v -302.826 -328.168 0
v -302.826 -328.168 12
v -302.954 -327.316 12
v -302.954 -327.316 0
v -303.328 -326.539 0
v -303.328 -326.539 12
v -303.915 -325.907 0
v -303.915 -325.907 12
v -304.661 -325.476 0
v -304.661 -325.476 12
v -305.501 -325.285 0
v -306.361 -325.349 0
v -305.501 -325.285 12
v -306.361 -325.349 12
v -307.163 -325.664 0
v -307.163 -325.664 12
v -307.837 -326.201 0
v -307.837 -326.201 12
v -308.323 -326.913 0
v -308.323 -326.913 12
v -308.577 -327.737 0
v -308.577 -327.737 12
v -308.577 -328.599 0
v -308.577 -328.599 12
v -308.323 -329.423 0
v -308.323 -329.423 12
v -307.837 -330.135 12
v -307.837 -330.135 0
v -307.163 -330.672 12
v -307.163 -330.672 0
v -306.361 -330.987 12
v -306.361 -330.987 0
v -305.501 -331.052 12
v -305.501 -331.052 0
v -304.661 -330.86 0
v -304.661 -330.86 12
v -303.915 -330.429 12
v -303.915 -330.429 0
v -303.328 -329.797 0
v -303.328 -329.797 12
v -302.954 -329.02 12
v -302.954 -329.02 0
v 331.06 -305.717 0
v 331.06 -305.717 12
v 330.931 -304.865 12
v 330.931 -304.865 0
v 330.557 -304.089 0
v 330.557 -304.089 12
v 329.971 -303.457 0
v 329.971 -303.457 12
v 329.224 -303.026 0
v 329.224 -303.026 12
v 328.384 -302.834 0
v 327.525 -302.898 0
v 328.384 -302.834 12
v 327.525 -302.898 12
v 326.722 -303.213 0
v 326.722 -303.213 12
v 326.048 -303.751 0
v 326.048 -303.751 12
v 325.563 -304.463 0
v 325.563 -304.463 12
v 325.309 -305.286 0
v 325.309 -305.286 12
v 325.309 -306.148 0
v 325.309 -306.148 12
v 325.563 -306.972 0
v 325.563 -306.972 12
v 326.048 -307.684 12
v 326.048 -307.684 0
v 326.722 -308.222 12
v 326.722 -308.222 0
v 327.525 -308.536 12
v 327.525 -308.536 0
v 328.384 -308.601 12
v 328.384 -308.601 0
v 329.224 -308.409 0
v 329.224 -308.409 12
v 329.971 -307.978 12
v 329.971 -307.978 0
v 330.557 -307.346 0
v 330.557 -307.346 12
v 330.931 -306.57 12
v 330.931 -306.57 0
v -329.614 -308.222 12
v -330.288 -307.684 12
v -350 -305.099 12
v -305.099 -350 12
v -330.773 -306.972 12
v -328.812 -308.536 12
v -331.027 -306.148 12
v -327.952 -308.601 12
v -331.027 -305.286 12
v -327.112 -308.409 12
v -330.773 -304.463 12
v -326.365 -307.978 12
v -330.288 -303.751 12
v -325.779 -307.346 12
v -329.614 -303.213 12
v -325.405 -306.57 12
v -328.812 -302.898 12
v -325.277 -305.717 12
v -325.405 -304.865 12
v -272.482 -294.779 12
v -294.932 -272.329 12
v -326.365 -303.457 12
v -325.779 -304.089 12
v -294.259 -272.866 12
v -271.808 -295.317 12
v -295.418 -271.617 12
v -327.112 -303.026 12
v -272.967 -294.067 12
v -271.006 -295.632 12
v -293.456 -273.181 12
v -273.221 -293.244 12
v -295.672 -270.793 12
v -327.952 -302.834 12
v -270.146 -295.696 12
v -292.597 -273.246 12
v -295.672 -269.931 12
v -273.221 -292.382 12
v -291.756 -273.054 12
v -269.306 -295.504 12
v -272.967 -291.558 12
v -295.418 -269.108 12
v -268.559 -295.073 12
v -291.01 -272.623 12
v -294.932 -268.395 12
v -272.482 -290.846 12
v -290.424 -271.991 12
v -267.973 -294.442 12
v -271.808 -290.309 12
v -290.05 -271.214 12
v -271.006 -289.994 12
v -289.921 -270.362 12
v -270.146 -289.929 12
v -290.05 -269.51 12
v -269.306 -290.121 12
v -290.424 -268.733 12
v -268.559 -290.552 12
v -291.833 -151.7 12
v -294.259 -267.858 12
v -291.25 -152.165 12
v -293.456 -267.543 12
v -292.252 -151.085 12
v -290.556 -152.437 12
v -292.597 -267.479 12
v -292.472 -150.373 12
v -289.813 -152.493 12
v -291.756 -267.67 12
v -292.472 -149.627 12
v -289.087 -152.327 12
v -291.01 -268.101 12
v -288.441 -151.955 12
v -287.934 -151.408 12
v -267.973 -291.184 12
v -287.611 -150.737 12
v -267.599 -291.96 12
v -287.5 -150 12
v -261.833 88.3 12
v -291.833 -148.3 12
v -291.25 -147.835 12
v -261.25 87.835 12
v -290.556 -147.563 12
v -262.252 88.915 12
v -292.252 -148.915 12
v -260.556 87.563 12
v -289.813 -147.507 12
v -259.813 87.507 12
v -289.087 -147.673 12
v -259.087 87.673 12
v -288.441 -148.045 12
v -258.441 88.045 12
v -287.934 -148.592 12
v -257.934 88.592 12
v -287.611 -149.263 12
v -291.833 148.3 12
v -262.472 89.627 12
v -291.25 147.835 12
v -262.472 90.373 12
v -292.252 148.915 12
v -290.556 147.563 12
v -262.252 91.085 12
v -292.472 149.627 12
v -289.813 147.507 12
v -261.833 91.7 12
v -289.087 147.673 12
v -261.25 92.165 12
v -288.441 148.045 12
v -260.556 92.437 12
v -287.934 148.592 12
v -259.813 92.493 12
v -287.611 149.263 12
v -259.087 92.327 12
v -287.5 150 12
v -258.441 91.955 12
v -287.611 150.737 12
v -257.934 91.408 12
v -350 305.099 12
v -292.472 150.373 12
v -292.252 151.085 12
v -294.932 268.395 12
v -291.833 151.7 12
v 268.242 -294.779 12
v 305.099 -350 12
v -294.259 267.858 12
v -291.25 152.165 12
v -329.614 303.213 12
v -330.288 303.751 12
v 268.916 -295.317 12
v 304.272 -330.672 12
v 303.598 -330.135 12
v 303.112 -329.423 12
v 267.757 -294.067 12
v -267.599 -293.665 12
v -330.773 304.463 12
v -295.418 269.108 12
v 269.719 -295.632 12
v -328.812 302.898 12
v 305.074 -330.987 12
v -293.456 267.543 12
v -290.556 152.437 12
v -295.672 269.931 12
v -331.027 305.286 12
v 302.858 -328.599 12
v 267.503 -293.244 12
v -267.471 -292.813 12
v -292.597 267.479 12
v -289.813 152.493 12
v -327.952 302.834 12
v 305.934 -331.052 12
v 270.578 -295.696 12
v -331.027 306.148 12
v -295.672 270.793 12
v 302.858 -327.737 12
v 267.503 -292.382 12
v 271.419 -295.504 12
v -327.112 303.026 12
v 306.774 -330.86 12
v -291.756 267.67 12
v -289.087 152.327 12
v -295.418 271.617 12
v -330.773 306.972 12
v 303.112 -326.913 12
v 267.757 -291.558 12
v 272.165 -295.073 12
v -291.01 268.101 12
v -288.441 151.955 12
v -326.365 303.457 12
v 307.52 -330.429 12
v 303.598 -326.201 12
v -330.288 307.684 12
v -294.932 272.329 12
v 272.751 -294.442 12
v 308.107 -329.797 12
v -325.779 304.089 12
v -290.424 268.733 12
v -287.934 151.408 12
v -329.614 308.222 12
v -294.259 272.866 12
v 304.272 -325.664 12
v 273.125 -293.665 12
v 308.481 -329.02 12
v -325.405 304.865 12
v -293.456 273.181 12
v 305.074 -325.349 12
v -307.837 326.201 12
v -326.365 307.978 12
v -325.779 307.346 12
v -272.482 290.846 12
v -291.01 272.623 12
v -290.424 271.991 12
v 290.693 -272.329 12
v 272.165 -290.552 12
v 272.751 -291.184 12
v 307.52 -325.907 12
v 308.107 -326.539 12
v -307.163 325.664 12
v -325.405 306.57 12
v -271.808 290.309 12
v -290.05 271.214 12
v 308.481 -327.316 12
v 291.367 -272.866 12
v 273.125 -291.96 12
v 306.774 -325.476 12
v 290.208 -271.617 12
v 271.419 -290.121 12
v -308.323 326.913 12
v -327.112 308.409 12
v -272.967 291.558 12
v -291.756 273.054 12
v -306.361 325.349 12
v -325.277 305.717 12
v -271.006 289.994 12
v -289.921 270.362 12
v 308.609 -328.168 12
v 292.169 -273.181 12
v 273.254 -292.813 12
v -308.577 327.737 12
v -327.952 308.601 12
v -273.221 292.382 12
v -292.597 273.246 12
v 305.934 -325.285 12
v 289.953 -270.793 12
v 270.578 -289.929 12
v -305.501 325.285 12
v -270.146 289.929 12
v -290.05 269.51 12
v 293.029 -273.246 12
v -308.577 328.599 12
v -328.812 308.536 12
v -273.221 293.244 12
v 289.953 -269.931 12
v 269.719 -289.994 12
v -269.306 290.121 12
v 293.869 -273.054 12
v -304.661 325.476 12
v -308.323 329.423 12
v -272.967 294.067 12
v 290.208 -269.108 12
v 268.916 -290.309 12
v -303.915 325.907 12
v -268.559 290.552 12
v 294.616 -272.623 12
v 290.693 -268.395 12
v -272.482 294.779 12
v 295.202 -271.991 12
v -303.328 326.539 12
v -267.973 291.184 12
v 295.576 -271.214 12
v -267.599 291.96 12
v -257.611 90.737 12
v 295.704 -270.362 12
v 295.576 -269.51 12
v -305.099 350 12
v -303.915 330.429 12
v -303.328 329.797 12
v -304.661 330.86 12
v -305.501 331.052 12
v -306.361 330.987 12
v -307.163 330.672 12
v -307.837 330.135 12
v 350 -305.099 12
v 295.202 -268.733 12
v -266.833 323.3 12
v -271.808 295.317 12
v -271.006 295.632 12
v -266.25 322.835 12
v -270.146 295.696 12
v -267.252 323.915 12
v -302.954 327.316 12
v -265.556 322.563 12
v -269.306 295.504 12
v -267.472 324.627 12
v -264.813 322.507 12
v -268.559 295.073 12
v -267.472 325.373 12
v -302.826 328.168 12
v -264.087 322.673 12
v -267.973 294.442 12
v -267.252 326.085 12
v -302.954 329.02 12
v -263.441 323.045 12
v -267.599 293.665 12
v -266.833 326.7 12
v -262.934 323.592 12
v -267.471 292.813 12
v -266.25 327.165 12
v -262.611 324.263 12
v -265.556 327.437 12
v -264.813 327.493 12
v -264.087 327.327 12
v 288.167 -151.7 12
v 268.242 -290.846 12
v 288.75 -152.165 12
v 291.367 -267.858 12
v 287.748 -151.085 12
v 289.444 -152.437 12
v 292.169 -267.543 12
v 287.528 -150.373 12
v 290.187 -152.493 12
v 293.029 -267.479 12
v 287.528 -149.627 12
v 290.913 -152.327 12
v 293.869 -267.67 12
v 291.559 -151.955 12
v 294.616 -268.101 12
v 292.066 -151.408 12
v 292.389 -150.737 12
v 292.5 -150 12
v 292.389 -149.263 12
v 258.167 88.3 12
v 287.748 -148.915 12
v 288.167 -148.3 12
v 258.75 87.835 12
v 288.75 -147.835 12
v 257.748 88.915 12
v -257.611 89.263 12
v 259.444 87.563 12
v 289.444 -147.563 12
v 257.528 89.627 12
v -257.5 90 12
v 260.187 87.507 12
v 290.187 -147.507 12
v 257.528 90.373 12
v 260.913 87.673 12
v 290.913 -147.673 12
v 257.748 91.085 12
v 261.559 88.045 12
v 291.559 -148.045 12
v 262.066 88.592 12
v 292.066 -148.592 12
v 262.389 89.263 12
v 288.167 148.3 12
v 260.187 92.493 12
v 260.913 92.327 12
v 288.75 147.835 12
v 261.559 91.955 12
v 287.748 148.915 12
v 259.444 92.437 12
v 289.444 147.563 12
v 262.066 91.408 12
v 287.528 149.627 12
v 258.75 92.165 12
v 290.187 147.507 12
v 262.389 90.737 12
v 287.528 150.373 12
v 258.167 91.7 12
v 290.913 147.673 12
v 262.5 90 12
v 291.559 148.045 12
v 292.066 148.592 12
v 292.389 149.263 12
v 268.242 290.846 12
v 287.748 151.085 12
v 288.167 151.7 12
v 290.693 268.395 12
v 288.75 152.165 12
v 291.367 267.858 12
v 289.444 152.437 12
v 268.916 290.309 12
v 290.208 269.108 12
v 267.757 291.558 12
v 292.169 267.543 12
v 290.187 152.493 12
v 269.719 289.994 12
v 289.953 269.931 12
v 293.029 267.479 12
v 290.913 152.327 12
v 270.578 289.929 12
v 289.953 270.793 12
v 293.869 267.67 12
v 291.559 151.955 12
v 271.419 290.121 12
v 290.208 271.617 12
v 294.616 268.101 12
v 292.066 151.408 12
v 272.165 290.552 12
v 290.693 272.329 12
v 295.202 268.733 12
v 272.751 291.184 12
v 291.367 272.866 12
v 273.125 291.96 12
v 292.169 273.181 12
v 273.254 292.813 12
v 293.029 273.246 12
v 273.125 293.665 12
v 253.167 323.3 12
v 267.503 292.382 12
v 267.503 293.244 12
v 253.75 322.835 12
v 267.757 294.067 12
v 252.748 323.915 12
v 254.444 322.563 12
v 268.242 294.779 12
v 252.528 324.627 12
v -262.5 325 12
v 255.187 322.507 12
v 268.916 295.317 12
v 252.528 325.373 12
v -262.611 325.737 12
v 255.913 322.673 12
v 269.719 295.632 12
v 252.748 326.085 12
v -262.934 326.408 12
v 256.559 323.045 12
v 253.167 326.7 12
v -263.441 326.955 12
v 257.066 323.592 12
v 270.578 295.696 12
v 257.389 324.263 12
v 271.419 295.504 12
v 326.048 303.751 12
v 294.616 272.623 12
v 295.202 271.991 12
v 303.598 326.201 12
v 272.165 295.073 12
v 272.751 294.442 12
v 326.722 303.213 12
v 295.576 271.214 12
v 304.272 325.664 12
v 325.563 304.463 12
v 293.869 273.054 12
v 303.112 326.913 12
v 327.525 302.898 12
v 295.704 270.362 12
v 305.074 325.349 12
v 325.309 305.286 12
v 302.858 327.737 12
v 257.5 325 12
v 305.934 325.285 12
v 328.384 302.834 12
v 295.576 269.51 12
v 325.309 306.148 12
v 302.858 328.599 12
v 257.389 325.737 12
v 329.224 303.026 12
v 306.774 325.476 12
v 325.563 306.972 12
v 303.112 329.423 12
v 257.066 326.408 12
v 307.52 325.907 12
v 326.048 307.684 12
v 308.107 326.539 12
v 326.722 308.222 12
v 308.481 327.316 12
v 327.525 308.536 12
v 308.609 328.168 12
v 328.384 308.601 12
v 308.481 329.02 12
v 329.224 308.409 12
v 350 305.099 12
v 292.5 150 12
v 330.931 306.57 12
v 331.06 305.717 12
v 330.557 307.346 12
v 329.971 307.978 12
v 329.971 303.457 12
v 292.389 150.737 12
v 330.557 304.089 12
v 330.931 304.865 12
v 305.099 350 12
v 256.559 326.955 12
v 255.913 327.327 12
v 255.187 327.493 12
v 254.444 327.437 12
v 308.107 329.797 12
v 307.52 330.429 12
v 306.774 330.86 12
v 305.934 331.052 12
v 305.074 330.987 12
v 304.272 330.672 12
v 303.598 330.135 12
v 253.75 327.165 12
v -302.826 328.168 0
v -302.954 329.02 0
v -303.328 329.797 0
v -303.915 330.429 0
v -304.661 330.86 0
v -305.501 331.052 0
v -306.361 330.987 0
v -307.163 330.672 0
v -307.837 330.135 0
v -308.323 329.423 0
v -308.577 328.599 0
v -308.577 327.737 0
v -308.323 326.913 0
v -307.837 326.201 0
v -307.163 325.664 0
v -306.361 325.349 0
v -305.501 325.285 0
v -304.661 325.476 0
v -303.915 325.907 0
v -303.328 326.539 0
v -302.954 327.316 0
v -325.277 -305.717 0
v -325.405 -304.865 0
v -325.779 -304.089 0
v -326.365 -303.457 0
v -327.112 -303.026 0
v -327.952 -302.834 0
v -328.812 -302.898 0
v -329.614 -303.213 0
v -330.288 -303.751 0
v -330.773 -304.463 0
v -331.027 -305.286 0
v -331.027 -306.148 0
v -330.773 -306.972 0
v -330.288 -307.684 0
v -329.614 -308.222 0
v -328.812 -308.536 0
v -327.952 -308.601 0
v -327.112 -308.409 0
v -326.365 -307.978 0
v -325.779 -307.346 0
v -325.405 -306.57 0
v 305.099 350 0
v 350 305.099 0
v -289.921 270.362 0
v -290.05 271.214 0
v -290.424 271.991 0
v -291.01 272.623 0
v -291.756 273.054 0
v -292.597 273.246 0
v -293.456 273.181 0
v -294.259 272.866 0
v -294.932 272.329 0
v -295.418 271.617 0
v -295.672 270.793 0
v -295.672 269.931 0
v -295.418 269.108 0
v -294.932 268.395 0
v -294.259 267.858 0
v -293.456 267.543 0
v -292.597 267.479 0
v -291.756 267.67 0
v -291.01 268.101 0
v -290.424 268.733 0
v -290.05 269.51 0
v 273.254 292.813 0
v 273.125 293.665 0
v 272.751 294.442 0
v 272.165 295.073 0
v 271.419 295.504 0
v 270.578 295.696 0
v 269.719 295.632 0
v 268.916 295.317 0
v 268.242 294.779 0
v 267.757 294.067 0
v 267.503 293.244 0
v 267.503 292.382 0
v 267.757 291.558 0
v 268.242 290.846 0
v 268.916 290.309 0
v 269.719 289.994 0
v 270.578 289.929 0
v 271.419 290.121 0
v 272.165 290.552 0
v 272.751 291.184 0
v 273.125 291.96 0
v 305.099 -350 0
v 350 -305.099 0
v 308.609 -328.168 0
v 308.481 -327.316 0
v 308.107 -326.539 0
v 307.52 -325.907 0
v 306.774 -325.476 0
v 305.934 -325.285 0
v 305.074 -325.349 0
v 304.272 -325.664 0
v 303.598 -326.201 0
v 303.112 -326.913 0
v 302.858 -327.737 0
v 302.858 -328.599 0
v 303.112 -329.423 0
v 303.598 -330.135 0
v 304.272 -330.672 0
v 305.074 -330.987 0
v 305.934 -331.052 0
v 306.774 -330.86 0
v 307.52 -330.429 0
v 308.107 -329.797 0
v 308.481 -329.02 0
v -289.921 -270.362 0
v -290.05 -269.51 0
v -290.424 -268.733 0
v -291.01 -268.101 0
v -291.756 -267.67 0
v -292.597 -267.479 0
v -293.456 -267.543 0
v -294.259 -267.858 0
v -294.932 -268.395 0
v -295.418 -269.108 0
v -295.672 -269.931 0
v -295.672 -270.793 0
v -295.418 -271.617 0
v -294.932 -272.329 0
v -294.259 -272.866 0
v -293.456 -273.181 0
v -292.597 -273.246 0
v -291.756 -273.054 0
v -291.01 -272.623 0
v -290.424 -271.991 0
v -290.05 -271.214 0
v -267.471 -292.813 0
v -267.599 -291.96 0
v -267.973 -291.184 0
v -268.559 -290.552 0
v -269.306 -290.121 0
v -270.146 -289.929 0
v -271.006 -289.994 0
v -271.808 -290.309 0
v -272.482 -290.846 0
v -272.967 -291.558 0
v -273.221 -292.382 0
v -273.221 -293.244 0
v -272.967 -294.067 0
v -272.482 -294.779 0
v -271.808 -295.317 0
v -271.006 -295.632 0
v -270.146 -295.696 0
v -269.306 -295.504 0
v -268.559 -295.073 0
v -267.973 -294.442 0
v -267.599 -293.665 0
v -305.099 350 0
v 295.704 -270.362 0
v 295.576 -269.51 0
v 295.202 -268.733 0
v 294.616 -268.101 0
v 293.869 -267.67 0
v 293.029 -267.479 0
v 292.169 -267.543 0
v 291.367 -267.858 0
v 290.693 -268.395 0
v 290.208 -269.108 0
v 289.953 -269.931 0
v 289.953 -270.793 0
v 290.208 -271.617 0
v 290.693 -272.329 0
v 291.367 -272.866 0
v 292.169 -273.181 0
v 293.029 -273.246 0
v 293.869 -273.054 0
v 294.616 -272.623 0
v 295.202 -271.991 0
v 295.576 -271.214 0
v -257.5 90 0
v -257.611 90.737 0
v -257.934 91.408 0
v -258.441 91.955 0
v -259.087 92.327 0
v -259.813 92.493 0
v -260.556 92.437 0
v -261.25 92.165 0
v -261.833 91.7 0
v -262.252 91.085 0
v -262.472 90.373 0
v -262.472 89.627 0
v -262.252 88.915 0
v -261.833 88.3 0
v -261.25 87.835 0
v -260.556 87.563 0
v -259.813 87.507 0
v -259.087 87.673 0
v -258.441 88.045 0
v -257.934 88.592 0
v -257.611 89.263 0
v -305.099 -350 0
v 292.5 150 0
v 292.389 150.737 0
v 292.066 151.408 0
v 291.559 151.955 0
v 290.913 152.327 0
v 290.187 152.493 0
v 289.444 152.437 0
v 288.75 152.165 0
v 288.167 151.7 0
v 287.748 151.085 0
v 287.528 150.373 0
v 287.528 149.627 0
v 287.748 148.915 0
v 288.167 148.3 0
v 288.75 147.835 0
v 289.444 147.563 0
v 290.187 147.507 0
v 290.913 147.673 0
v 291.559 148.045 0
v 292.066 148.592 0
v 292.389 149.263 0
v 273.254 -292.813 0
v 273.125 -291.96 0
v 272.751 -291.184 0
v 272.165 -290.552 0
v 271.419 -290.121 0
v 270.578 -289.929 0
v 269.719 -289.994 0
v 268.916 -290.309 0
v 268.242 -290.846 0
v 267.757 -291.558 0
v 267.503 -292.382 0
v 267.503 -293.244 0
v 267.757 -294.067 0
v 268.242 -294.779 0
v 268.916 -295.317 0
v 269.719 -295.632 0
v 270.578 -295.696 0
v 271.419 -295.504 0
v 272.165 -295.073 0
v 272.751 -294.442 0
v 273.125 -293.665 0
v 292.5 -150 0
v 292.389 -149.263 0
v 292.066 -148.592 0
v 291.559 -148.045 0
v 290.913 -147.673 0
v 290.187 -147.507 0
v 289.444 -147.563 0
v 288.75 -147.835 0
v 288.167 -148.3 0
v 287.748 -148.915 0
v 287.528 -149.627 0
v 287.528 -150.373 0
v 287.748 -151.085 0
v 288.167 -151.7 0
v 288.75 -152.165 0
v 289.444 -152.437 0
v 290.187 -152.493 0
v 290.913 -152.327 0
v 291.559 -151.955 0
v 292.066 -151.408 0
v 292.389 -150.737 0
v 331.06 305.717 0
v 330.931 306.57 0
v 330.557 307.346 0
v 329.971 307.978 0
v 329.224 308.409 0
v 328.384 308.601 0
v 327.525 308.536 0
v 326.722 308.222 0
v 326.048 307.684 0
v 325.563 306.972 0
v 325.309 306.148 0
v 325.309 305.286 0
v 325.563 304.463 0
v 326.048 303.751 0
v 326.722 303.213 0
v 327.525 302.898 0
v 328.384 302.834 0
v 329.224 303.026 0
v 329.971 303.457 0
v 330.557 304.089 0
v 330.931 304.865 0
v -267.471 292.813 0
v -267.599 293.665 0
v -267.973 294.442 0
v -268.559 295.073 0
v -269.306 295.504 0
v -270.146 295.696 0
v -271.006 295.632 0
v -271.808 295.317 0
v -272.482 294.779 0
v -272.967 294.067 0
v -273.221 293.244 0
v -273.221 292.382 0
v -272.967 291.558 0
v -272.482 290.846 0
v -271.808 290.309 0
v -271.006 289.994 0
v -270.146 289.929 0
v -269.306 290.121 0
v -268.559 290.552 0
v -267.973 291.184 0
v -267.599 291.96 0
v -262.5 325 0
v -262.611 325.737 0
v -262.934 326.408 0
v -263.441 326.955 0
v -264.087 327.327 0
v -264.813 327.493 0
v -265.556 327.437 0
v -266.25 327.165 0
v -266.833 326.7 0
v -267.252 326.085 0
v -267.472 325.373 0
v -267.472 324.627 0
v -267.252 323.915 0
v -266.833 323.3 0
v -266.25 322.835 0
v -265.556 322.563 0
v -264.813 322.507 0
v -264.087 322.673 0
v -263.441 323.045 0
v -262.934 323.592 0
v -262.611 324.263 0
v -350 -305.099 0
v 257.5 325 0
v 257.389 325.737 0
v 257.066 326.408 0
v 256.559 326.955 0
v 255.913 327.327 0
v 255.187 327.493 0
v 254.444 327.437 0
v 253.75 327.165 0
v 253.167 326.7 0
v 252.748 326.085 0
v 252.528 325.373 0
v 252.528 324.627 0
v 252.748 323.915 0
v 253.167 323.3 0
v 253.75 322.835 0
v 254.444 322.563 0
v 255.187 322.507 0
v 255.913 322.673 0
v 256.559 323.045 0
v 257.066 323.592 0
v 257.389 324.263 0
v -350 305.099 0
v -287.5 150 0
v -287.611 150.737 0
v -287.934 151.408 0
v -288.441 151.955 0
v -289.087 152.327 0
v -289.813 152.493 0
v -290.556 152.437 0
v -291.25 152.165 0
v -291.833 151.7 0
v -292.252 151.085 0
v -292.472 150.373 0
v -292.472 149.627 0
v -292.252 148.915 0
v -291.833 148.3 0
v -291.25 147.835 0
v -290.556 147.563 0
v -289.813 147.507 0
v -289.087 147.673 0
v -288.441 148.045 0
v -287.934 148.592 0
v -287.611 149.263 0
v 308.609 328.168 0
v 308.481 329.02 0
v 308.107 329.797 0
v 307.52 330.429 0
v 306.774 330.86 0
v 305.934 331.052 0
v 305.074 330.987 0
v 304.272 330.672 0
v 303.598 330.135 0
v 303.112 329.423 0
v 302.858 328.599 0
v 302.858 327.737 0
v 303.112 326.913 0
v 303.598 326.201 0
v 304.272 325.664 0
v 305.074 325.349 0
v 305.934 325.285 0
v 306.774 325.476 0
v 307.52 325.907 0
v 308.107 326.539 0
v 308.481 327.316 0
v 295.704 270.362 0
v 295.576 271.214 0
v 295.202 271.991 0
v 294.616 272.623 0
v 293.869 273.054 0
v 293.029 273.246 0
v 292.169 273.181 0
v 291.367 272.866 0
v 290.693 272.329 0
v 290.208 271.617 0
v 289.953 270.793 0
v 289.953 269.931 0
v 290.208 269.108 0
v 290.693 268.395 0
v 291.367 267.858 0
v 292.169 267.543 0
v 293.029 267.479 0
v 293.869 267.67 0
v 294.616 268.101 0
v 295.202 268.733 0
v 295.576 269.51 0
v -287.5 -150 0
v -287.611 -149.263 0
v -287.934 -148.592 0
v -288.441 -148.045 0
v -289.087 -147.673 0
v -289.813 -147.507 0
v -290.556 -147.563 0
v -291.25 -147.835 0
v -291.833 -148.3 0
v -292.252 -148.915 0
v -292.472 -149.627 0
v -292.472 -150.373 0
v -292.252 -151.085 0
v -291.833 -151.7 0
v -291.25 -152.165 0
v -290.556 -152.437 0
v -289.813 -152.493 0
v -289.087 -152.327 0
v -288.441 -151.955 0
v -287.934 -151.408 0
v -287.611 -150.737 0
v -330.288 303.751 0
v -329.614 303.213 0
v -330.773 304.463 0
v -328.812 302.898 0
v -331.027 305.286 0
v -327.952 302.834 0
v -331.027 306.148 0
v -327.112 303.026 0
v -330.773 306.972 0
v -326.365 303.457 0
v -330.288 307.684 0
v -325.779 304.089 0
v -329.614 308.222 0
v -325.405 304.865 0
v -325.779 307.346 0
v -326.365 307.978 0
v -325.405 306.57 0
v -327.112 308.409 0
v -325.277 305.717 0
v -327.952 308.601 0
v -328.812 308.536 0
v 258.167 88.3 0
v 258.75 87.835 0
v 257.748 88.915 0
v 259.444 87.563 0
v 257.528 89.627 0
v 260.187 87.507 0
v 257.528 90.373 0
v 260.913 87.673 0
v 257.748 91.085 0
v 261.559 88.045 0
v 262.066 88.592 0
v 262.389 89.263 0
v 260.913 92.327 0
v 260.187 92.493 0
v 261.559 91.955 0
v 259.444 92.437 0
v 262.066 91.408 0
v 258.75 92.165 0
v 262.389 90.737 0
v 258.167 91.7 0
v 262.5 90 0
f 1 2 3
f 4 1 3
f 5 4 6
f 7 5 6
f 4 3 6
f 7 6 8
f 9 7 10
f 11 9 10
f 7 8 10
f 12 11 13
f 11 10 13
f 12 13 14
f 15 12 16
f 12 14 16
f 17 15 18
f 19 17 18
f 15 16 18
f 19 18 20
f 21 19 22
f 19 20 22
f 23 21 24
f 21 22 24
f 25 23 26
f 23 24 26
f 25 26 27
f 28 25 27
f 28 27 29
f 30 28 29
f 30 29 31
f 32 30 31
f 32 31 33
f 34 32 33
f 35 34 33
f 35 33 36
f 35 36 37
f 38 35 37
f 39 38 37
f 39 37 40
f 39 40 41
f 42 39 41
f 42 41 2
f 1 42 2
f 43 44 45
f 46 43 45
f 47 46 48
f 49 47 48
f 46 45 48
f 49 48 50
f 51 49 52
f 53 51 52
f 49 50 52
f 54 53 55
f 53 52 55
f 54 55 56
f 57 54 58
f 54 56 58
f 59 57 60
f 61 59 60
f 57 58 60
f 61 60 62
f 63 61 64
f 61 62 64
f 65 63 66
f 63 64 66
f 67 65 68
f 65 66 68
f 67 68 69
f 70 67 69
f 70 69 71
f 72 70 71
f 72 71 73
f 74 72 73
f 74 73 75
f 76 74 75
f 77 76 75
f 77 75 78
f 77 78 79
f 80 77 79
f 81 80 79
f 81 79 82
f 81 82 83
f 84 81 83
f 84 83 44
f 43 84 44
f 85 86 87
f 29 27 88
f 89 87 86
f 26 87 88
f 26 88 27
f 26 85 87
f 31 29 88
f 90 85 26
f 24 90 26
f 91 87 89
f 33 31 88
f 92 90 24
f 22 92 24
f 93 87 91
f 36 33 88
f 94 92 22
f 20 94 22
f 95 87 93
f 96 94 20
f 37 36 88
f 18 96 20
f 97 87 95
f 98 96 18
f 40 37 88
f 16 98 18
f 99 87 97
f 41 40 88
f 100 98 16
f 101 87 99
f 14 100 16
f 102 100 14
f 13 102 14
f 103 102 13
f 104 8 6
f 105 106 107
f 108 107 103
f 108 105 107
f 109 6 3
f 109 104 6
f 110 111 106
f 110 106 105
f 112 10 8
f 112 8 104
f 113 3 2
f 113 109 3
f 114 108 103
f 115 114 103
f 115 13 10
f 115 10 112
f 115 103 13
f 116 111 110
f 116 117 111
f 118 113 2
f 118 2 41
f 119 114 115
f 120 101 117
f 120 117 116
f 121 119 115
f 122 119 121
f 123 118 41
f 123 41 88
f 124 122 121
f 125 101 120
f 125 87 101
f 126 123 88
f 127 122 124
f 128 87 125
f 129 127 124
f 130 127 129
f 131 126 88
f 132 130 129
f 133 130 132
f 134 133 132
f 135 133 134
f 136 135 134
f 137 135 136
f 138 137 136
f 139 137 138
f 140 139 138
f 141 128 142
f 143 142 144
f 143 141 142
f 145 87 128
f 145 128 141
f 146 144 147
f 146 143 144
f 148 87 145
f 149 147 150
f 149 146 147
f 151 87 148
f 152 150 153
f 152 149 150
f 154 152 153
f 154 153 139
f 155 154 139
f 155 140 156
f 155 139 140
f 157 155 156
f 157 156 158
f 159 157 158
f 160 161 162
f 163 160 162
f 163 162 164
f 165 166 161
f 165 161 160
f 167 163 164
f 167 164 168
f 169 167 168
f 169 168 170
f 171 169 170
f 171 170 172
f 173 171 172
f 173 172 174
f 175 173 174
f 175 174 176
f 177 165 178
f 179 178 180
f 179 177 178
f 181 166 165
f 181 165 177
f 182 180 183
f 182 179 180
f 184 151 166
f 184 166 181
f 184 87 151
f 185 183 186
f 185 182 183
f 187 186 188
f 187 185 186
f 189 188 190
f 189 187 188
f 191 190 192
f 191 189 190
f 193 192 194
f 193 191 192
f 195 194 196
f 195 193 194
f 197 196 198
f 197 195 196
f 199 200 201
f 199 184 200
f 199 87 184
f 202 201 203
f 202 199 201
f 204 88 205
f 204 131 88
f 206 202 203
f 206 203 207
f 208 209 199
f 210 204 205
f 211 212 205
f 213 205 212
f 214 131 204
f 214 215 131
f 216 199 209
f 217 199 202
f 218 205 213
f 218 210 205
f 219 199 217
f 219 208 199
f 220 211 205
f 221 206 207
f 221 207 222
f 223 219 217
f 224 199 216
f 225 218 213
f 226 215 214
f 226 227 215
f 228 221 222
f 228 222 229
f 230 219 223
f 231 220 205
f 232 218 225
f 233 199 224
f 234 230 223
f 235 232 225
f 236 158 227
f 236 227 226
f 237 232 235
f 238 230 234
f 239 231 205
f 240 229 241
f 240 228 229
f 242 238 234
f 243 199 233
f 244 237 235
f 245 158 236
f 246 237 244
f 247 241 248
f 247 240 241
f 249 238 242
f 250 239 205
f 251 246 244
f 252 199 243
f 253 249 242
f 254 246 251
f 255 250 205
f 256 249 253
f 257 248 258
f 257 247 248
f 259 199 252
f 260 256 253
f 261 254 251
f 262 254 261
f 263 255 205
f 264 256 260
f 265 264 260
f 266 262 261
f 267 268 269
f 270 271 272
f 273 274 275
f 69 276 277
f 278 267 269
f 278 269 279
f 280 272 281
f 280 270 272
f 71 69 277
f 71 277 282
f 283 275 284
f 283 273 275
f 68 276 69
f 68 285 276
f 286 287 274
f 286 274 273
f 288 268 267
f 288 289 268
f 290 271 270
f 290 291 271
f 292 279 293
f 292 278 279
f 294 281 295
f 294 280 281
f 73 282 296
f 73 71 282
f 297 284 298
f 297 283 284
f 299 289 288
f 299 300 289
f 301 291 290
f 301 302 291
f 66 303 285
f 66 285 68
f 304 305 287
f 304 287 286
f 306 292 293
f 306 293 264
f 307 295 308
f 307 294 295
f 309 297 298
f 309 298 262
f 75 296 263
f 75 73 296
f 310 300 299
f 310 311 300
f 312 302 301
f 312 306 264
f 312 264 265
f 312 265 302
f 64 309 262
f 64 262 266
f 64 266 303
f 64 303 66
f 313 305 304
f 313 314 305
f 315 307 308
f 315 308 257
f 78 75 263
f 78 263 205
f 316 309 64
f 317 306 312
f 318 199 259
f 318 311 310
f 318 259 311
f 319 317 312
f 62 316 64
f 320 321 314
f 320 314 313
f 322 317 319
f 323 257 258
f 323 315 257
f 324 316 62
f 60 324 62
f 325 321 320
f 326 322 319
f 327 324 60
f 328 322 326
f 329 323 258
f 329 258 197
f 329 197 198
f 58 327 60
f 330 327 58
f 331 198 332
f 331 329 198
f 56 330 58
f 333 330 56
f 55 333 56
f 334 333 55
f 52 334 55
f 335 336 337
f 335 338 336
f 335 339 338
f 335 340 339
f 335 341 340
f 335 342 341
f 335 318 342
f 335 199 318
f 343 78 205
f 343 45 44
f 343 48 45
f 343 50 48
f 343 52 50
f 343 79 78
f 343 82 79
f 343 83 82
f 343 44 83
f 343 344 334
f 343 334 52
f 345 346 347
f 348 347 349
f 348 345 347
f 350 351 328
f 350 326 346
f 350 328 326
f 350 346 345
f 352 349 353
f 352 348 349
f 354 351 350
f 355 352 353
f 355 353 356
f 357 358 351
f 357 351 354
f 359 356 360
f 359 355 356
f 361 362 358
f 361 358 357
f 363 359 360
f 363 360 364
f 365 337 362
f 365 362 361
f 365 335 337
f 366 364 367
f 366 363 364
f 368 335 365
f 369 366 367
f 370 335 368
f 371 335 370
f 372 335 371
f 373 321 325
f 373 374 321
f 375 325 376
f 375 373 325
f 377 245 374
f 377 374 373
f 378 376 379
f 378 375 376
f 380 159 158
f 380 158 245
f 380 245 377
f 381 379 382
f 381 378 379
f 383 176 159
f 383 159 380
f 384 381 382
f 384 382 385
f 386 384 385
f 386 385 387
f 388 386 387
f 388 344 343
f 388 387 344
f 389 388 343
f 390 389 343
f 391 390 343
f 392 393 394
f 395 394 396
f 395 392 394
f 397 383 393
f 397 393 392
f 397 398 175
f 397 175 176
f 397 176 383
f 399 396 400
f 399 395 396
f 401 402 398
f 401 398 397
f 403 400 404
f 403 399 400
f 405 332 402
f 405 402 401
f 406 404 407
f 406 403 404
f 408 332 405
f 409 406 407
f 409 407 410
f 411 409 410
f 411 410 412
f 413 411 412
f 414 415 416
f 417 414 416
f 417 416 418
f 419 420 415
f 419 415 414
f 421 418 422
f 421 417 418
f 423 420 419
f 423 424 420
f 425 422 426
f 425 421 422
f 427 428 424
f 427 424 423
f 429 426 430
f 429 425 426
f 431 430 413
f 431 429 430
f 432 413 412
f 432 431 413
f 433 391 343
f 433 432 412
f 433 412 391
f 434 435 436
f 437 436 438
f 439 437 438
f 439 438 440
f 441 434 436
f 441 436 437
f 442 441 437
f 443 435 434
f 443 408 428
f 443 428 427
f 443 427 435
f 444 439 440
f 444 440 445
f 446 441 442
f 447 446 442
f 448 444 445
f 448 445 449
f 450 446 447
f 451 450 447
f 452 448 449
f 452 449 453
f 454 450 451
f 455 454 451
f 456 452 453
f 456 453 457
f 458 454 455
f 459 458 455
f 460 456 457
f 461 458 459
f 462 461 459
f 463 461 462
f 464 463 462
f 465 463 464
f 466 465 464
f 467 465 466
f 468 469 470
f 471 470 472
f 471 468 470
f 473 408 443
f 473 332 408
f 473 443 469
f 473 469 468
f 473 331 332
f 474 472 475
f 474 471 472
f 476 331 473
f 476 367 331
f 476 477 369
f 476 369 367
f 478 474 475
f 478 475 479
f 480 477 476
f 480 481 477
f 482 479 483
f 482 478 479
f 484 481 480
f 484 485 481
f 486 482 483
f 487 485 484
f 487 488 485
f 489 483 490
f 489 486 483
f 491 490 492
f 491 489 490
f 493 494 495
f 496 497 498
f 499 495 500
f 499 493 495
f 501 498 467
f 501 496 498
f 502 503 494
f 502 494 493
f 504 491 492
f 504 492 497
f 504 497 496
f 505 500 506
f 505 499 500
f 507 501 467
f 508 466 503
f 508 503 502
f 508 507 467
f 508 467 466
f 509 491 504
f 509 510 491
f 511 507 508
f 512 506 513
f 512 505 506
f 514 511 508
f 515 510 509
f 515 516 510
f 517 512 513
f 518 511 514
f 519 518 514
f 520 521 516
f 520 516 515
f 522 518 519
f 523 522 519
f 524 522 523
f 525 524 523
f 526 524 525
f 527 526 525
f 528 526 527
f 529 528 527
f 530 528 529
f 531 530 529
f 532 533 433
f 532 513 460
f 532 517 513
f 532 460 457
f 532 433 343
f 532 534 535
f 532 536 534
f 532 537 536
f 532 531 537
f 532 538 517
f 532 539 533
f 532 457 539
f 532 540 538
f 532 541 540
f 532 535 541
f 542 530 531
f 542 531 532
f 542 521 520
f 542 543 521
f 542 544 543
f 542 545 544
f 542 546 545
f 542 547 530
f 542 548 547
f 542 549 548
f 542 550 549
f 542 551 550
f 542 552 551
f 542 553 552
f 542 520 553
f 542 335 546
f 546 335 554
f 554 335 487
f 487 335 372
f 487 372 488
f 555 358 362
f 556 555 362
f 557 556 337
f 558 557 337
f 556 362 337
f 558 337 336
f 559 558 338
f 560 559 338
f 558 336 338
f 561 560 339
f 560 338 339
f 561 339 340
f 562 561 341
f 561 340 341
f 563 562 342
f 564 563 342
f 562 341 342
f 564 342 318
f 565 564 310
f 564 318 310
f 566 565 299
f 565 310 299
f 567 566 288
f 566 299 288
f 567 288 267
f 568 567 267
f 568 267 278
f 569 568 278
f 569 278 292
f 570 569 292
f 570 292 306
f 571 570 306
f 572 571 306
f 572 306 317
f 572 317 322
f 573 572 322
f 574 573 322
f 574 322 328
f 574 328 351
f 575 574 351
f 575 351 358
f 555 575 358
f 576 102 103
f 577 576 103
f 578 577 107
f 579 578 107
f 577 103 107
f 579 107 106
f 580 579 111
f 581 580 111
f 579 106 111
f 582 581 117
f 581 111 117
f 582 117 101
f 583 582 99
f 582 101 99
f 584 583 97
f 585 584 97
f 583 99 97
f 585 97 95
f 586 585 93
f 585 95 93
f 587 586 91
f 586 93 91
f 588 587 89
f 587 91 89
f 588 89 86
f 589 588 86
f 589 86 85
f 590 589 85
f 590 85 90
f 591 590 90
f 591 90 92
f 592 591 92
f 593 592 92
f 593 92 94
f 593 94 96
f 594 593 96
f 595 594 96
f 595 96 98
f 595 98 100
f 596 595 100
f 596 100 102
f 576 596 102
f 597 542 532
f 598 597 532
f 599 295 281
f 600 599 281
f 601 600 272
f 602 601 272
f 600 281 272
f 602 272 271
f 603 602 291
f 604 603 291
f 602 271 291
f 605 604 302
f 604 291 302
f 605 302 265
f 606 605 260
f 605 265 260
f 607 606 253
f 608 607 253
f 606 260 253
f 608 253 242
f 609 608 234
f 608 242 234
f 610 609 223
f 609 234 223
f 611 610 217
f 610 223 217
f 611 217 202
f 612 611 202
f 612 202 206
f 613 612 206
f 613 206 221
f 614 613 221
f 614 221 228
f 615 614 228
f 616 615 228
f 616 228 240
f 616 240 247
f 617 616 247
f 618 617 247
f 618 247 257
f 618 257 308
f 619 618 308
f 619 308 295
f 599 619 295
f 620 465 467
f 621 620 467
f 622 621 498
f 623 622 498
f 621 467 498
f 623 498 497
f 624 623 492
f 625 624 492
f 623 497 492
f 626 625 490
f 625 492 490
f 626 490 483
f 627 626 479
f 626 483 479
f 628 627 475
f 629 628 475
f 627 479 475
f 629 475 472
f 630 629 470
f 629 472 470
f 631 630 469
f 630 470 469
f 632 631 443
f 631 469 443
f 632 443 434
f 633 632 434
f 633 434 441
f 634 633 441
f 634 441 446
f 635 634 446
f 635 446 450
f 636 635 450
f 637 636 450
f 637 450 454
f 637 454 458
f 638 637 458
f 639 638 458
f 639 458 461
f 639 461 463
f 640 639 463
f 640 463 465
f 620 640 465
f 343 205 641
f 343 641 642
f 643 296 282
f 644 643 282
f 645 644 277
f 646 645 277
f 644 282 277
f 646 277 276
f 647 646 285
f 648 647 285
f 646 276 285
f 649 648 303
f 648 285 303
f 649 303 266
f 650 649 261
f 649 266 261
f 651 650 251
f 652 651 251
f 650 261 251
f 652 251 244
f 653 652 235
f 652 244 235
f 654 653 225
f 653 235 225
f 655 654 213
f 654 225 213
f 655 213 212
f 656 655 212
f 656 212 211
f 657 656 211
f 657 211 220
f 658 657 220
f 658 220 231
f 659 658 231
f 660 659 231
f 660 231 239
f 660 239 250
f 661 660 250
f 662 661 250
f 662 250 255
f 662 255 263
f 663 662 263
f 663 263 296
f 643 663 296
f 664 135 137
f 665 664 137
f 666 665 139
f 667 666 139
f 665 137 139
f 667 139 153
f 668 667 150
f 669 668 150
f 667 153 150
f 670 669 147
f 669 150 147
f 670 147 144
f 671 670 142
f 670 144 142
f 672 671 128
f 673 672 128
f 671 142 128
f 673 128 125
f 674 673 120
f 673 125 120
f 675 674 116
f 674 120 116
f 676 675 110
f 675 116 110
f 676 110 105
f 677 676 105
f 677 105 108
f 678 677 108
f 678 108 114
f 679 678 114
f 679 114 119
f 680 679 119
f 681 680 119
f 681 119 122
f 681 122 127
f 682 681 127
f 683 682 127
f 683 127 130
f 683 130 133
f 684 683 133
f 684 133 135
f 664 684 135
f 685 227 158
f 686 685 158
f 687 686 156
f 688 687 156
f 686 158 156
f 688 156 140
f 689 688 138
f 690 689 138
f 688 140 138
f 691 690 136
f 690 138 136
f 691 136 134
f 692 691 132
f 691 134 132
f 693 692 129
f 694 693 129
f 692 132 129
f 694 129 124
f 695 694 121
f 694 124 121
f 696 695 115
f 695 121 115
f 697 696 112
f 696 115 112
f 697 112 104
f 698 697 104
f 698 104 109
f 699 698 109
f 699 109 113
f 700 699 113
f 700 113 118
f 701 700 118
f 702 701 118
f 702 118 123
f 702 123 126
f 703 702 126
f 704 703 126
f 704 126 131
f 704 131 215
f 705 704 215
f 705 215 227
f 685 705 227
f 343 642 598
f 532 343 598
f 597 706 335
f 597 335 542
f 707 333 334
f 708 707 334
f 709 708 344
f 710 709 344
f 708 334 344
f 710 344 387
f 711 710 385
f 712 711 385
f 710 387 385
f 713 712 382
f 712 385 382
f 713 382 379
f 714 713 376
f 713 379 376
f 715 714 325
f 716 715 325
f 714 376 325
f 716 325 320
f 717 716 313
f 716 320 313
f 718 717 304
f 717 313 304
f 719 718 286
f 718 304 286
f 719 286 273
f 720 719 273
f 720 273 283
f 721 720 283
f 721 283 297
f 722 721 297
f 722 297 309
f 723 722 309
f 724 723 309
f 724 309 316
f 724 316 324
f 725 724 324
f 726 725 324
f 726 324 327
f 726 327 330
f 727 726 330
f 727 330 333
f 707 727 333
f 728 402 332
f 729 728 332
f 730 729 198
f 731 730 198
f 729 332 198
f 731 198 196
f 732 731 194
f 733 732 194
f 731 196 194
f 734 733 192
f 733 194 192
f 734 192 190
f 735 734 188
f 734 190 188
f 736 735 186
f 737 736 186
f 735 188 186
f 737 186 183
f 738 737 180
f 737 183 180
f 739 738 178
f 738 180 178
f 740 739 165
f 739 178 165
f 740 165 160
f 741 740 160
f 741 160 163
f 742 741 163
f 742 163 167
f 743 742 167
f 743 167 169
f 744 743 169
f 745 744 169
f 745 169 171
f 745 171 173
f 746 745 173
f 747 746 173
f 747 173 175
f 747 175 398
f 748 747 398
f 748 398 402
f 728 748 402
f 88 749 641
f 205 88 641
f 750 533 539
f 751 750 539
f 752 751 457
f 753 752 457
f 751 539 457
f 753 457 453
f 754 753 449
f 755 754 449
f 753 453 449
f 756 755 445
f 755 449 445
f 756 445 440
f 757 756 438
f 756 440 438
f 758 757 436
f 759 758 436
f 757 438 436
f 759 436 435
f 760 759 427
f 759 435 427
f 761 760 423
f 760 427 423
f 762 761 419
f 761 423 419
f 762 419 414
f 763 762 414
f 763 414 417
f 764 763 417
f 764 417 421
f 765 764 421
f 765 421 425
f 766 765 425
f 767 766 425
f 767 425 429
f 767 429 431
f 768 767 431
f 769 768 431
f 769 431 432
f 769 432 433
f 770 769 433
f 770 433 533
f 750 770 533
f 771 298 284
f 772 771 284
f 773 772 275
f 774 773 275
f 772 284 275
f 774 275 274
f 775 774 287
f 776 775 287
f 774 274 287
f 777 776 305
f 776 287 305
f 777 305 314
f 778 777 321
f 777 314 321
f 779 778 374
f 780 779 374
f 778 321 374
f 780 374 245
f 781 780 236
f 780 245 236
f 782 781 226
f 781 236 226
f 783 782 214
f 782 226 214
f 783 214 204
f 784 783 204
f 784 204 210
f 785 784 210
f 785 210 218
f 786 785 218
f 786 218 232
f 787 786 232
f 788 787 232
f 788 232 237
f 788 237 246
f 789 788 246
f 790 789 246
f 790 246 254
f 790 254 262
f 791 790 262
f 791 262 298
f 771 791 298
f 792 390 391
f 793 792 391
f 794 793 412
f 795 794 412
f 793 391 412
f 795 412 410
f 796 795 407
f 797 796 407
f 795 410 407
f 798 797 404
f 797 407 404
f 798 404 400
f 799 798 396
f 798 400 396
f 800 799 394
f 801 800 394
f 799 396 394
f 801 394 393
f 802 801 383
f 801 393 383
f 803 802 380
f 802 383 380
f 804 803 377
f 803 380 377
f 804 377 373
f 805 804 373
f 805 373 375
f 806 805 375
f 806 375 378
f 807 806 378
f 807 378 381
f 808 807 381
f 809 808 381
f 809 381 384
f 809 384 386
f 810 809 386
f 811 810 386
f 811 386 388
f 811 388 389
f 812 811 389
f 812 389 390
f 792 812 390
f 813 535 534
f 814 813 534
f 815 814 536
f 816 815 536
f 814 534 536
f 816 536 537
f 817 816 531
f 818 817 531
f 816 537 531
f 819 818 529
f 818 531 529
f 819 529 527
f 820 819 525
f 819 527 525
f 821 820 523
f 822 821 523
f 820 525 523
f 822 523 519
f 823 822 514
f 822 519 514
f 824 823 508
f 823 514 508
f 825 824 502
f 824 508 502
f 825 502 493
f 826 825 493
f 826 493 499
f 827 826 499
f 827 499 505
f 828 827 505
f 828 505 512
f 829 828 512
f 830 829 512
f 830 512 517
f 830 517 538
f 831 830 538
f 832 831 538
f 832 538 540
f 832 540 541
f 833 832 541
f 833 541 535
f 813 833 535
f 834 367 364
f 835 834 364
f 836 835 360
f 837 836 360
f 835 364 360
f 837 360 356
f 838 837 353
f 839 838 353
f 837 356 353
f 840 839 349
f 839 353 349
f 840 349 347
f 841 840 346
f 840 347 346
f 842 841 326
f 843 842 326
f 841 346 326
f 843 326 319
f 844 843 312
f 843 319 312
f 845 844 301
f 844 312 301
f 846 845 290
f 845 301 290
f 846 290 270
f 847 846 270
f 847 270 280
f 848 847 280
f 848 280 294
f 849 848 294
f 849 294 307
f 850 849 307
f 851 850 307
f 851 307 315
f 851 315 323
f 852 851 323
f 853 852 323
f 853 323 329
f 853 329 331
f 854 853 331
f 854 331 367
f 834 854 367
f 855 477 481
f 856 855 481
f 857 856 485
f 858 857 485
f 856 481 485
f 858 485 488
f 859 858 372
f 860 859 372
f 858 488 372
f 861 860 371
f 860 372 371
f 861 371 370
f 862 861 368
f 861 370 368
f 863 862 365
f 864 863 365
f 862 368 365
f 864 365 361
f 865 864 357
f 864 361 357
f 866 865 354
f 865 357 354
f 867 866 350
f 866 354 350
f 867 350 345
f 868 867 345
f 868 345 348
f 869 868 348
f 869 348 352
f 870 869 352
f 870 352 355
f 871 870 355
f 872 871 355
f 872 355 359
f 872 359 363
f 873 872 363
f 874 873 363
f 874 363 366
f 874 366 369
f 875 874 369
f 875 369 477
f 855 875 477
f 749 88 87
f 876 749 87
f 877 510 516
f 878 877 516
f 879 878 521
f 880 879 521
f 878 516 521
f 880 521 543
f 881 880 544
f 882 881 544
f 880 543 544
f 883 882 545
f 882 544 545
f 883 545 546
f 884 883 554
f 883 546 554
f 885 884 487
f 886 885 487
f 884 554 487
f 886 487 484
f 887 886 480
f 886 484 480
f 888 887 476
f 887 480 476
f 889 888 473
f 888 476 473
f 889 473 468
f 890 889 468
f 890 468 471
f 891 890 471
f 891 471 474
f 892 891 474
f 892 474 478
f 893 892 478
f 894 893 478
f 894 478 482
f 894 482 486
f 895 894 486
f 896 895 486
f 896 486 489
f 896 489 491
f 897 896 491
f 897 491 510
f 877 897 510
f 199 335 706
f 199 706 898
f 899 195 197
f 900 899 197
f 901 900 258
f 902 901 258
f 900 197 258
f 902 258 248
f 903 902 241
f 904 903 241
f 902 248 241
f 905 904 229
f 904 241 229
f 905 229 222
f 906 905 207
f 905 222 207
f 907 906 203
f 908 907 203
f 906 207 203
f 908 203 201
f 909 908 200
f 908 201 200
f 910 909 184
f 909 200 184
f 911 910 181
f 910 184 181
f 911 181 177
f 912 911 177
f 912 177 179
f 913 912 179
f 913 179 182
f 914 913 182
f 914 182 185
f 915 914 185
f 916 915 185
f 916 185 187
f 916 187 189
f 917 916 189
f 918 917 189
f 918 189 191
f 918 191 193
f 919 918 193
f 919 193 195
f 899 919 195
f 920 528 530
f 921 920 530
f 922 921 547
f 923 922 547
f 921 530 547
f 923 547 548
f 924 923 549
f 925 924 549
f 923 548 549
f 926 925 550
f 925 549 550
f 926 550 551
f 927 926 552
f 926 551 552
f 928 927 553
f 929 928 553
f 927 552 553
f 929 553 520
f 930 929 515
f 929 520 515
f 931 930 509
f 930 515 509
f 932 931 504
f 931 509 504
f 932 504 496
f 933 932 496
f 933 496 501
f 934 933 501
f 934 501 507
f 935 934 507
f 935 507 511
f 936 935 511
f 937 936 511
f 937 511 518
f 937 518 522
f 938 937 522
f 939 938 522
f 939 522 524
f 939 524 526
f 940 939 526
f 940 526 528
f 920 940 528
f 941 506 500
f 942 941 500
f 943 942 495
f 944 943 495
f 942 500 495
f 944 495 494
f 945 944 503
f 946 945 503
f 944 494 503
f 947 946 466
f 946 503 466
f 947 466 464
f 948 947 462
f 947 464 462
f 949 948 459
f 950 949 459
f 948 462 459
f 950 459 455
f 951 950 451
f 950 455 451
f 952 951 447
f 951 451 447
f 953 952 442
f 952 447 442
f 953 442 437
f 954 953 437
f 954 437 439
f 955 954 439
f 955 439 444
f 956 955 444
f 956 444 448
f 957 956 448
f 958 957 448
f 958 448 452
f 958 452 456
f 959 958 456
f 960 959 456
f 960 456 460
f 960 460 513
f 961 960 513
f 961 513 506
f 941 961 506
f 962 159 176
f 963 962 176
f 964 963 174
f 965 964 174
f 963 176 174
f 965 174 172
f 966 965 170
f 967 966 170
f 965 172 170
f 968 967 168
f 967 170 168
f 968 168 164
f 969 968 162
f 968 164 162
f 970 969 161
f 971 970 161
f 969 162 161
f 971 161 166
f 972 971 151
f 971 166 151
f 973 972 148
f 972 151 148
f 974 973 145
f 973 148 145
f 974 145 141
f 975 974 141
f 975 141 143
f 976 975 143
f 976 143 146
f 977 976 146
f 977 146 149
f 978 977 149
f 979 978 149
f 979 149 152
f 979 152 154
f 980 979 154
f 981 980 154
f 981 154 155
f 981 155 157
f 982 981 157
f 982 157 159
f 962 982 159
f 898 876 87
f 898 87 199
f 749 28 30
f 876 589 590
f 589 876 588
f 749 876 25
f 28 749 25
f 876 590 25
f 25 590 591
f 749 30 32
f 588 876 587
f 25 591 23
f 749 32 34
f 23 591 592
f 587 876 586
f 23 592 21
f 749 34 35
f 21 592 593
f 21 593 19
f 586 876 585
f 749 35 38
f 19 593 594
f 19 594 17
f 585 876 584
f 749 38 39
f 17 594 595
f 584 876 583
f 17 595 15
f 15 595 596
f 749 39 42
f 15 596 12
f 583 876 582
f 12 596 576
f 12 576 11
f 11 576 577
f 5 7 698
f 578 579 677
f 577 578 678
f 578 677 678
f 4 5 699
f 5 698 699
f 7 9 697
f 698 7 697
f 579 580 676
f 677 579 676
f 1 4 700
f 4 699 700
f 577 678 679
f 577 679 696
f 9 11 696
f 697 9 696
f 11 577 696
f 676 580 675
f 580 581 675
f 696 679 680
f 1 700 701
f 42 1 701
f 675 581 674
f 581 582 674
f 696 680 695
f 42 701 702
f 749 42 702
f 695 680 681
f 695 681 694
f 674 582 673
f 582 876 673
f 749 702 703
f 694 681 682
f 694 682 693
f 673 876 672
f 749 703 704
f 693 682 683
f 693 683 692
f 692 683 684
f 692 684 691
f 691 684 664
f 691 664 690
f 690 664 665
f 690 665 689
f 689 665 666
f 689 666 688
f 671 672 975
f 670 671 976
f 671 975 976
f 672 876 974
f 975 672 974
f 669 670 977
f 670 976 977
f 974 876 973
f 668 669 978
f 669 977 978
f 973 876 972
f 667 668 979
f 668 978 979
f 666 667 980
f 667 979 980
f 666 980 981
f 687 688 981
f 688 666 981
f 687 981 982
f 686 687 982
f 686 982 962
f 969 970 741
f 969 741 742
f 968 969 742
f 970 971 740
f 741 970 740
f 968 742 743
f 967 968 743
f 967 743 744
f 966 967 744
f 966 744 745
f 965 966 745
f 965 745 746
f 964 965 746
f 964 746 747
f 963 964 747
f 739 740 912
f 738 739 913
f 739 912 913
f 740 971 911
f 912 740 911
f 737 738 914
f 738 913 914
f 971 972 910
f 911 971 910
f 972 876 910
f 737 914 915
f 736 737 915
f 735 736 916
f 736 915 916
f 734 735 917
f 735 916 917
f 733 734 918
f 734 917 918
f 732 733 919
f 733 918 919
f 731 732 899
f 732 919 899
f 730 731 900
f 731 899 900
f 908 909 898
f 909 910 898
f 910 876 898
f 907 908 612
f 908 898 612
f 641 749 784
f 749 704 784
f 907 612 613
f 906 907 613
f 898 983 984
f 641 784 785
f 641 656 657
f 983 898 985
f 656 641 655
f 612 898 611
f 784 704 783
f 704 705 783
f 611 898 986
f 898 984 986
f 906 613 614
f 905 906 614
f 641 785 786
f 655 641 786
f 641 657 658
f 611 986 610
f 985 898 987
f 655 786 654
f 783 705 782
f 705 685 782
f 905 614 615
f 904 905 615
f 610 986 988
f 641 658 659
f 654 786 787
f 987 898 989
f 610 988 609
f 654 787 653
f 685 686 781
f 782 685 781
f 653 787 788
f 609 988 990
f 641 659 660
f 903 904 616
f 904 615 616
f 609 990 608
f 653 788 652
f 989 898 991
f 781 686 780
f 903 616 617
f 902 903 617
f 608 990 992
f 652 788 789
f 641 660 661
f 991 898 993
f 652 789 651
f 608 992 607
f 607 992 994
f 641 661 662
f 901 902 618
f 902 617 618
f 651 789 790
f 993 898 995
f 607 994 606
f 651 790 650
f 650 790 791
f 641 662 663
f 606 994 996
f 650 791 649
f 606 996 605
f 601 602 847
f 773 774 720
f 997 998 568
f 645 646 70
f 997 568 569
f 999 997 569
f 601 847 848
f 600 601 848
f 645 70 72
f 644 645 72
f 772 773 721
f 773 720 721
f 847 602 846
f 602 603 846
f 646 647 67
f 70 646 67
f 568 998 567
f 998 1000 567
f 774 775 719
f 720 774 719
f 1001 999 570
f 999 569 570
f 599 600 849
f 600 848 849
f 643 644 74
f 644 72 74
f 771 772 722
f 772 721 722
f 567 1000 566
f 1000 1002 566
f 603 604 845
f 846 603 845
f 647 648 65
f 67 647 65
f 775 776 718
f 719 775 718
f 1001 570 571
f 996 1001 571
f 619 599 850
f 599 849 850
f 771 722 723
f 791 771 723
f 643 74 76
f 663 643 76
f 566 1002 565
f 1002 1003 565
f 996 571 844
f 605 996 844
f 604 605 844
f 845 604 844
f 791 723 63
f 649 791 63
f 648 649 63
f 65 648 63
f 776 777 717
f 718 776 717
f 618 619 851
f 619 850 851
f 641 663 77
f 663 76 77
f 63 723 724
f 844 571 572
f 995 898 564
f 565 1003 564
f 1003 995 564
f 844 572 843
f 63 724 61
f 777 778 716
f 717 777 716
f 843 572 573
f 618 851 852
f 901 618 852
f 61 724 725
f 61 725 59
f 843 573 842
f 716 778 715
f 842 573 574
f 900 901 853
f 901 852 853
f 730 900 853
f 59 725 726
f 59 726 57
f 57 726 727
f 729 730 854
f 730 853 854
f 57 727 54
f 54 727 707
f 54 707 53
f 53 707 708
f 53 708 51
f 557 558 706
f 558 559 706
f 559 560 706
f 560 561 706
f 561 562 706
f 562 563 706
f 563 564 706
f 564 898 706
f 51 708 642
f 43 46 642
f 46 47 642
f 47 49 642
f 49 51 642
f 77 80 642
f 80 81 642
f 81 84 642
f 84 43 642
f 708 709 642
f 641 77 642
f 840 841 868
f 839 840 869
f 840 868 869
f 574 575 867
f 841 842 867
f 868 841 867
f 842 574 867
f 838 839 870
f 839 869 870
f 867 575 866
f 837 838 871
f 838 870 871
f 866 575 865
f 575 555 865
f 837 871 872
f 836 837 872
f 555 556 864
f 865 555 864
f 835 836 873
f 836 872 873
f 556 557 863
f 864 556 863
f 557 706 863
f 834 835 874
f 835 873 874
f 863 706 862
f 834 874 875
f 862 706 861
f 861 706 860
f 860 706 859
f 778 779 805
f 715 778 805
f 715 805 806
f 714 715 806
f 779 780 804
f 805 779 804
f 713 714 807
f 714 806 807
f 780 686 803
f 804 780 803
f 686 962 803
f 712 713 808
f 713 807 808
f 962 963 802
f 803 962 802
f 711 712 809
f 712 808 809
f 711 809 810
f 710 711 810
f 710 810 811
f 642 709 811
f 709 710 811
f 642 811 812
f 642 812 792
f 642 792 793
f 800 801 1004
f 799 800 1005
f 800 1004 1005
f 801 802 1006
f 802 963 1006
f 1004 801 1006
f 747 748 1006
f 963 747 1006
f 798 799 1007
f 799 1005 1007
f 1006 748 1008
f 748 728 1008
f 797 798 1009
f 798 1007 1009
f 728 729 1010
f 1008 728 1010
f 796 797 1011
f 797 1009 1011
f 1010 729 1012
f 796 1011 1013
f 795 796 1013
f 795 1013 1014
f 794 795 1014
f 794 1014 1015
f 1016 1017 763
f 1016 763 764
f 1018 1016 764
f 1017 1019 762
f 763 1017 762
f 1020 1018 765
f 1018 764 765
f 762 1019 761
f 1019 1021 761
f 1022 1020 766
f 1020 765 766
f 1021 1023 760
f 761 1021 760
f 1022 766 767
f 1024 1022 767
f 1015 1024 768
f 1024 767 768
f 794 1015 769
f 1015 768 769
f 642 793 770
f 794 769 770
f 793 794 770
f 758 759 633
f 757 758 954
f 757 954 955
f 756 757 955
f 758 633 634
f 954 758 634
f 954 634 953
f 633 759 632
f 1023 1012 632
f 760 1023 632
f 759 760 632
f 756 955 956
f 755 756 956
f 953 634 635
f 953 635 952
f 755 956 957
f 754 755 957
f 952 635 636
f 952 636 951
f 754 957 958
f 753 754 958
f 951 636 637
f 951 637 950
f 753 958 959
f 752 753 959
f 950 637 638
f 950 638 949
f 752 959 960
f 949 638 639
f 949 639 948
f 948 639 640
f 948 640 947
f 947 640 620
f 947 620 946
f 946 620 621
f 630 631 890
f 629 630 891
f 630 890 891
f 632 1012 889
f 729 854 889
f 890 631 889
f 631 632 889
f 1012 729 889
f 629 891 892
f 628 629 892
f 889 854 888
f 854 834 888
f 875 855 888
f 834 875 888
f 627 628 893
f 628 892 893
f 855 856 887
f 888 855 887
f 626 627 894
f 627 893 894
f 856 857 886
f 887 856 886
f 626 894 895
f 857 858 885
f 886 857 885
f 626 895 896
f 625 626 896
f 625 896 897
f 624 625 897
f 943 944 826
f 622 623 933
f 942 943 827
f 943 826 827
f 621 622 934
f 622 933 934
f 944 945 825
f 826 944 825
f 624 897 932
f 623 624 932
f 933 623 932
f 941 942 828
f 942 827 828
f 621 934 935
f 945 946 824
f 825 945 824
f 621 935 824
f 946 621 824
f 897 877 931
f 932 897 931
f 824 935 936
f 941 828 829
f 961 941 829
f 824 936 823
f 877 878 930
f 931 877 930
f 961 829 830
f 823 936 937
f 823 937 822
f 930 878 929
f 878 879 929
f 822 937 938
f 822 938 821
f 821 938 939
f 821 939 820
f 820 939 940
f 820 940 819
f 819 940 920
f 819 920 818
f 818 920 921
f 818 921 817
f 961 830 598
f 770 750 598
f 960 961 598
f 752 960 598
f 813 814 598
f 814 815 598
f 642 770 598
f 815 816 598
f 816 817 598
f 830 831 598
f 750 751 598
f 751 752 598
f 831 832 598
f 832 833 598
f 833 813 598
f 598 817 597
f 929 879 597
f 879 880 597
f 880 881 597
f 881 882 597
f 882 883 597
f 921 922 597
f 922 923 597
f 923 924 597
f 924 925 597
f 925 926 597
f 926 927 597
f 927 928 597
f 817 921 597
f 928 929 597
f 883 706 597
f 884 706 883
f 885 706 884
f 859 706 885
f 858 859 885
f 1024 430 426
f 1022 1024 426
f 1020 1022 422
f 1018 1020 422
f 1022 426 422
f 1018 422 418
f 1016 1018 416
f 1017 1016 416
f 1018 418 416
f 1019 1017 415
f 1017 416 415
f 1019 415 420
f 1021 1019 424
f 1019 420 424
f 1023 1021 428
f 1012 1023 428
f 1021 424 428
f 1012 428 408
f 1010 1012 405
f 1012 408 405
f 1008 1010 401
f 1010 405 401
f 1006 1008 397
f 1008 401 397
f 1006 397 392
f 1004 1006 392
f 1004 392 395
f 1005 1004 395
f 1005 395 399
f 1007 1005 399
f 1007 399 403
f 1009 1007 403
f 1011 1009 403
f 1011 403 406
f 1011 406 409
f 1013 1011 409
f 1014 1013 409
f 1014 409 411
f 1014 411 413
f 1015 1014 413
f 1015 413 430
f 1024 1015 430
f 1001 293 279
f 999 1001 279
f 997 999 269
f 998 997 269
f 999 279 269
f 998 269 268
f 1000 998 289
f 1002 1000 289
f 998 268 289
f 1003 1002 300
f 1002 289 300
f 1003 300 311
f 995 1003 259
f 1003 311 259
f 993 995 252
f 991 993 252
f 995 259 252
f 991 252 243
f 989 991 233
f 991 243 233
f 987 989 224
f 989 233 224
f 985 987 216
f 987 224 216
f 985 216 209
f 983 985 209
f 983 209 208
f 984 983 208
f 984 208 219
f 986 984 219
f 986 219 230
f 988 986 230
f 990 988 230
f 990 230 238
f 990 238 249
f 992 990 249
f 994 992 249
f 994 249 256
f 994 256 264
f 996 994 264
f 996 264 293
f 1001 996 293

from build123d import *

# Parameters (mm, degrees)
SKETCH1_W           = 700
SKETCH1_H           = 700
BOSS_EXTRUDE1_DEPTH = 12
SKETCH3_R           = 2.891550533
CUT_EXTRUDE2_DEPTH  = 13
SKETCH4_R           = 2.5
CUT_EXTRUDE3_DEPTH  = 20


with BuildPart() as part:
    # Sketch1 → Boss-Extrude1 (new body)
    with BuildSketch(Plane.XY):
        Rectangle(SKETCH1_W, SKETCH1_H)
    extrude(amount=BOSS_EXTRUDE1_DEPTH)

    # Sketch3 → Cut-Extrude2 (cut, through all)
    with BuildSketch(Plane.XY.offset(12)):
        with Locations((305.717437828, 328.168078131)):
            Circle(SKETCH3_R)
        with Locations((328.168078131, 305.717437828)):
            Circle(SKETCH3_R)
        with Locations((292.812739072, 270.362098769)):
            Circle(SKETCH3_R)
        with Locations((270.362098769, 292.812739072)):
            Circle(SKETCH3_R)
        with Locations((-270.362098769, 292.812739072)):
            Circle(SKETCH3_R)
        with Locations((-292.812739072, 270.362098769)):
            Circle(SKETCH3_R)
        with Locations((-305.717437828, 328.168078131)):
            Circle(SKETCH3_R)
        with Locations((-328.168078131, 305.717437828)):
            Circle(SKETCH3_R)
        with Locations((270.362098769, -292.812739072)):
            Circle(SKETCH3_R)
        with Locations((305.717437828, -328.168078131)):
            Circle(SKETCH3_R)
        with Locations((328.168078131, -305.717437828)):
            Circle(SKETCH3_R)
        with Locations((292.812739072, -270.362098769)):
            Circle(SKETCH3_R)
        with Locations((-270.362098769, -292.812739072)):
            Circle(SKETCH3_R)
        with Locations((-292.812739072, -270.362098769)):
            Circle(SKETCH3_R)
        with Locations((-305.717437828, -328.168078131)):
            Circle(SKETCH3_R)
        with Locations((-328.168078131, -305.717437828)):
            Circle(SKETCH3_R)
        Polygon((350, 350), (305.098719395, 350), (350, 305.098719395), align=None)
        Polygon((-305.098719395, 350), (-350, 305.098719395), (-350, 350), align=None)
        Polygon((305.098719395, -350), (350, -305.098719395), (350, -350), align=None)
        Polygon((-350, -350), (-305.098719395, -350), (-350, -305.098719395), align=None)
    extrude(amount=-CUT_EXTRUDE2_DEPTH, mode=Mode.SUBTRACT)

    # Sketch4 → Cut-Extrude3 (cut)
    with BuildSketch(Plane.XY.offset(12)):
        with Locations((-290, 150)):
            Circle(SKETCH4_R)
        with Locations((290, 150)):
            Circle(SKETCH4_R)
        with Locations((290, -150)):
            Circle(SKETCH4_R)
        with Locations((-290, -150)):
            Circle(SKETCH4_R)
        with Locations((-265, 325)):
            Circle(SKETCH4_R)
        with Locations((255, 325)):
            Circle(SKETCH4_R)
        with Locations((-260, 90)):
            Circle(SKETCH4_R)
        with Locations((260, 90)):
            Circle(SKETCH4_R)
    extrude(amount=-CUT_EXTRUDE3_DEPTH, mode=Mode.SUBTRACT)


solid = part.part
